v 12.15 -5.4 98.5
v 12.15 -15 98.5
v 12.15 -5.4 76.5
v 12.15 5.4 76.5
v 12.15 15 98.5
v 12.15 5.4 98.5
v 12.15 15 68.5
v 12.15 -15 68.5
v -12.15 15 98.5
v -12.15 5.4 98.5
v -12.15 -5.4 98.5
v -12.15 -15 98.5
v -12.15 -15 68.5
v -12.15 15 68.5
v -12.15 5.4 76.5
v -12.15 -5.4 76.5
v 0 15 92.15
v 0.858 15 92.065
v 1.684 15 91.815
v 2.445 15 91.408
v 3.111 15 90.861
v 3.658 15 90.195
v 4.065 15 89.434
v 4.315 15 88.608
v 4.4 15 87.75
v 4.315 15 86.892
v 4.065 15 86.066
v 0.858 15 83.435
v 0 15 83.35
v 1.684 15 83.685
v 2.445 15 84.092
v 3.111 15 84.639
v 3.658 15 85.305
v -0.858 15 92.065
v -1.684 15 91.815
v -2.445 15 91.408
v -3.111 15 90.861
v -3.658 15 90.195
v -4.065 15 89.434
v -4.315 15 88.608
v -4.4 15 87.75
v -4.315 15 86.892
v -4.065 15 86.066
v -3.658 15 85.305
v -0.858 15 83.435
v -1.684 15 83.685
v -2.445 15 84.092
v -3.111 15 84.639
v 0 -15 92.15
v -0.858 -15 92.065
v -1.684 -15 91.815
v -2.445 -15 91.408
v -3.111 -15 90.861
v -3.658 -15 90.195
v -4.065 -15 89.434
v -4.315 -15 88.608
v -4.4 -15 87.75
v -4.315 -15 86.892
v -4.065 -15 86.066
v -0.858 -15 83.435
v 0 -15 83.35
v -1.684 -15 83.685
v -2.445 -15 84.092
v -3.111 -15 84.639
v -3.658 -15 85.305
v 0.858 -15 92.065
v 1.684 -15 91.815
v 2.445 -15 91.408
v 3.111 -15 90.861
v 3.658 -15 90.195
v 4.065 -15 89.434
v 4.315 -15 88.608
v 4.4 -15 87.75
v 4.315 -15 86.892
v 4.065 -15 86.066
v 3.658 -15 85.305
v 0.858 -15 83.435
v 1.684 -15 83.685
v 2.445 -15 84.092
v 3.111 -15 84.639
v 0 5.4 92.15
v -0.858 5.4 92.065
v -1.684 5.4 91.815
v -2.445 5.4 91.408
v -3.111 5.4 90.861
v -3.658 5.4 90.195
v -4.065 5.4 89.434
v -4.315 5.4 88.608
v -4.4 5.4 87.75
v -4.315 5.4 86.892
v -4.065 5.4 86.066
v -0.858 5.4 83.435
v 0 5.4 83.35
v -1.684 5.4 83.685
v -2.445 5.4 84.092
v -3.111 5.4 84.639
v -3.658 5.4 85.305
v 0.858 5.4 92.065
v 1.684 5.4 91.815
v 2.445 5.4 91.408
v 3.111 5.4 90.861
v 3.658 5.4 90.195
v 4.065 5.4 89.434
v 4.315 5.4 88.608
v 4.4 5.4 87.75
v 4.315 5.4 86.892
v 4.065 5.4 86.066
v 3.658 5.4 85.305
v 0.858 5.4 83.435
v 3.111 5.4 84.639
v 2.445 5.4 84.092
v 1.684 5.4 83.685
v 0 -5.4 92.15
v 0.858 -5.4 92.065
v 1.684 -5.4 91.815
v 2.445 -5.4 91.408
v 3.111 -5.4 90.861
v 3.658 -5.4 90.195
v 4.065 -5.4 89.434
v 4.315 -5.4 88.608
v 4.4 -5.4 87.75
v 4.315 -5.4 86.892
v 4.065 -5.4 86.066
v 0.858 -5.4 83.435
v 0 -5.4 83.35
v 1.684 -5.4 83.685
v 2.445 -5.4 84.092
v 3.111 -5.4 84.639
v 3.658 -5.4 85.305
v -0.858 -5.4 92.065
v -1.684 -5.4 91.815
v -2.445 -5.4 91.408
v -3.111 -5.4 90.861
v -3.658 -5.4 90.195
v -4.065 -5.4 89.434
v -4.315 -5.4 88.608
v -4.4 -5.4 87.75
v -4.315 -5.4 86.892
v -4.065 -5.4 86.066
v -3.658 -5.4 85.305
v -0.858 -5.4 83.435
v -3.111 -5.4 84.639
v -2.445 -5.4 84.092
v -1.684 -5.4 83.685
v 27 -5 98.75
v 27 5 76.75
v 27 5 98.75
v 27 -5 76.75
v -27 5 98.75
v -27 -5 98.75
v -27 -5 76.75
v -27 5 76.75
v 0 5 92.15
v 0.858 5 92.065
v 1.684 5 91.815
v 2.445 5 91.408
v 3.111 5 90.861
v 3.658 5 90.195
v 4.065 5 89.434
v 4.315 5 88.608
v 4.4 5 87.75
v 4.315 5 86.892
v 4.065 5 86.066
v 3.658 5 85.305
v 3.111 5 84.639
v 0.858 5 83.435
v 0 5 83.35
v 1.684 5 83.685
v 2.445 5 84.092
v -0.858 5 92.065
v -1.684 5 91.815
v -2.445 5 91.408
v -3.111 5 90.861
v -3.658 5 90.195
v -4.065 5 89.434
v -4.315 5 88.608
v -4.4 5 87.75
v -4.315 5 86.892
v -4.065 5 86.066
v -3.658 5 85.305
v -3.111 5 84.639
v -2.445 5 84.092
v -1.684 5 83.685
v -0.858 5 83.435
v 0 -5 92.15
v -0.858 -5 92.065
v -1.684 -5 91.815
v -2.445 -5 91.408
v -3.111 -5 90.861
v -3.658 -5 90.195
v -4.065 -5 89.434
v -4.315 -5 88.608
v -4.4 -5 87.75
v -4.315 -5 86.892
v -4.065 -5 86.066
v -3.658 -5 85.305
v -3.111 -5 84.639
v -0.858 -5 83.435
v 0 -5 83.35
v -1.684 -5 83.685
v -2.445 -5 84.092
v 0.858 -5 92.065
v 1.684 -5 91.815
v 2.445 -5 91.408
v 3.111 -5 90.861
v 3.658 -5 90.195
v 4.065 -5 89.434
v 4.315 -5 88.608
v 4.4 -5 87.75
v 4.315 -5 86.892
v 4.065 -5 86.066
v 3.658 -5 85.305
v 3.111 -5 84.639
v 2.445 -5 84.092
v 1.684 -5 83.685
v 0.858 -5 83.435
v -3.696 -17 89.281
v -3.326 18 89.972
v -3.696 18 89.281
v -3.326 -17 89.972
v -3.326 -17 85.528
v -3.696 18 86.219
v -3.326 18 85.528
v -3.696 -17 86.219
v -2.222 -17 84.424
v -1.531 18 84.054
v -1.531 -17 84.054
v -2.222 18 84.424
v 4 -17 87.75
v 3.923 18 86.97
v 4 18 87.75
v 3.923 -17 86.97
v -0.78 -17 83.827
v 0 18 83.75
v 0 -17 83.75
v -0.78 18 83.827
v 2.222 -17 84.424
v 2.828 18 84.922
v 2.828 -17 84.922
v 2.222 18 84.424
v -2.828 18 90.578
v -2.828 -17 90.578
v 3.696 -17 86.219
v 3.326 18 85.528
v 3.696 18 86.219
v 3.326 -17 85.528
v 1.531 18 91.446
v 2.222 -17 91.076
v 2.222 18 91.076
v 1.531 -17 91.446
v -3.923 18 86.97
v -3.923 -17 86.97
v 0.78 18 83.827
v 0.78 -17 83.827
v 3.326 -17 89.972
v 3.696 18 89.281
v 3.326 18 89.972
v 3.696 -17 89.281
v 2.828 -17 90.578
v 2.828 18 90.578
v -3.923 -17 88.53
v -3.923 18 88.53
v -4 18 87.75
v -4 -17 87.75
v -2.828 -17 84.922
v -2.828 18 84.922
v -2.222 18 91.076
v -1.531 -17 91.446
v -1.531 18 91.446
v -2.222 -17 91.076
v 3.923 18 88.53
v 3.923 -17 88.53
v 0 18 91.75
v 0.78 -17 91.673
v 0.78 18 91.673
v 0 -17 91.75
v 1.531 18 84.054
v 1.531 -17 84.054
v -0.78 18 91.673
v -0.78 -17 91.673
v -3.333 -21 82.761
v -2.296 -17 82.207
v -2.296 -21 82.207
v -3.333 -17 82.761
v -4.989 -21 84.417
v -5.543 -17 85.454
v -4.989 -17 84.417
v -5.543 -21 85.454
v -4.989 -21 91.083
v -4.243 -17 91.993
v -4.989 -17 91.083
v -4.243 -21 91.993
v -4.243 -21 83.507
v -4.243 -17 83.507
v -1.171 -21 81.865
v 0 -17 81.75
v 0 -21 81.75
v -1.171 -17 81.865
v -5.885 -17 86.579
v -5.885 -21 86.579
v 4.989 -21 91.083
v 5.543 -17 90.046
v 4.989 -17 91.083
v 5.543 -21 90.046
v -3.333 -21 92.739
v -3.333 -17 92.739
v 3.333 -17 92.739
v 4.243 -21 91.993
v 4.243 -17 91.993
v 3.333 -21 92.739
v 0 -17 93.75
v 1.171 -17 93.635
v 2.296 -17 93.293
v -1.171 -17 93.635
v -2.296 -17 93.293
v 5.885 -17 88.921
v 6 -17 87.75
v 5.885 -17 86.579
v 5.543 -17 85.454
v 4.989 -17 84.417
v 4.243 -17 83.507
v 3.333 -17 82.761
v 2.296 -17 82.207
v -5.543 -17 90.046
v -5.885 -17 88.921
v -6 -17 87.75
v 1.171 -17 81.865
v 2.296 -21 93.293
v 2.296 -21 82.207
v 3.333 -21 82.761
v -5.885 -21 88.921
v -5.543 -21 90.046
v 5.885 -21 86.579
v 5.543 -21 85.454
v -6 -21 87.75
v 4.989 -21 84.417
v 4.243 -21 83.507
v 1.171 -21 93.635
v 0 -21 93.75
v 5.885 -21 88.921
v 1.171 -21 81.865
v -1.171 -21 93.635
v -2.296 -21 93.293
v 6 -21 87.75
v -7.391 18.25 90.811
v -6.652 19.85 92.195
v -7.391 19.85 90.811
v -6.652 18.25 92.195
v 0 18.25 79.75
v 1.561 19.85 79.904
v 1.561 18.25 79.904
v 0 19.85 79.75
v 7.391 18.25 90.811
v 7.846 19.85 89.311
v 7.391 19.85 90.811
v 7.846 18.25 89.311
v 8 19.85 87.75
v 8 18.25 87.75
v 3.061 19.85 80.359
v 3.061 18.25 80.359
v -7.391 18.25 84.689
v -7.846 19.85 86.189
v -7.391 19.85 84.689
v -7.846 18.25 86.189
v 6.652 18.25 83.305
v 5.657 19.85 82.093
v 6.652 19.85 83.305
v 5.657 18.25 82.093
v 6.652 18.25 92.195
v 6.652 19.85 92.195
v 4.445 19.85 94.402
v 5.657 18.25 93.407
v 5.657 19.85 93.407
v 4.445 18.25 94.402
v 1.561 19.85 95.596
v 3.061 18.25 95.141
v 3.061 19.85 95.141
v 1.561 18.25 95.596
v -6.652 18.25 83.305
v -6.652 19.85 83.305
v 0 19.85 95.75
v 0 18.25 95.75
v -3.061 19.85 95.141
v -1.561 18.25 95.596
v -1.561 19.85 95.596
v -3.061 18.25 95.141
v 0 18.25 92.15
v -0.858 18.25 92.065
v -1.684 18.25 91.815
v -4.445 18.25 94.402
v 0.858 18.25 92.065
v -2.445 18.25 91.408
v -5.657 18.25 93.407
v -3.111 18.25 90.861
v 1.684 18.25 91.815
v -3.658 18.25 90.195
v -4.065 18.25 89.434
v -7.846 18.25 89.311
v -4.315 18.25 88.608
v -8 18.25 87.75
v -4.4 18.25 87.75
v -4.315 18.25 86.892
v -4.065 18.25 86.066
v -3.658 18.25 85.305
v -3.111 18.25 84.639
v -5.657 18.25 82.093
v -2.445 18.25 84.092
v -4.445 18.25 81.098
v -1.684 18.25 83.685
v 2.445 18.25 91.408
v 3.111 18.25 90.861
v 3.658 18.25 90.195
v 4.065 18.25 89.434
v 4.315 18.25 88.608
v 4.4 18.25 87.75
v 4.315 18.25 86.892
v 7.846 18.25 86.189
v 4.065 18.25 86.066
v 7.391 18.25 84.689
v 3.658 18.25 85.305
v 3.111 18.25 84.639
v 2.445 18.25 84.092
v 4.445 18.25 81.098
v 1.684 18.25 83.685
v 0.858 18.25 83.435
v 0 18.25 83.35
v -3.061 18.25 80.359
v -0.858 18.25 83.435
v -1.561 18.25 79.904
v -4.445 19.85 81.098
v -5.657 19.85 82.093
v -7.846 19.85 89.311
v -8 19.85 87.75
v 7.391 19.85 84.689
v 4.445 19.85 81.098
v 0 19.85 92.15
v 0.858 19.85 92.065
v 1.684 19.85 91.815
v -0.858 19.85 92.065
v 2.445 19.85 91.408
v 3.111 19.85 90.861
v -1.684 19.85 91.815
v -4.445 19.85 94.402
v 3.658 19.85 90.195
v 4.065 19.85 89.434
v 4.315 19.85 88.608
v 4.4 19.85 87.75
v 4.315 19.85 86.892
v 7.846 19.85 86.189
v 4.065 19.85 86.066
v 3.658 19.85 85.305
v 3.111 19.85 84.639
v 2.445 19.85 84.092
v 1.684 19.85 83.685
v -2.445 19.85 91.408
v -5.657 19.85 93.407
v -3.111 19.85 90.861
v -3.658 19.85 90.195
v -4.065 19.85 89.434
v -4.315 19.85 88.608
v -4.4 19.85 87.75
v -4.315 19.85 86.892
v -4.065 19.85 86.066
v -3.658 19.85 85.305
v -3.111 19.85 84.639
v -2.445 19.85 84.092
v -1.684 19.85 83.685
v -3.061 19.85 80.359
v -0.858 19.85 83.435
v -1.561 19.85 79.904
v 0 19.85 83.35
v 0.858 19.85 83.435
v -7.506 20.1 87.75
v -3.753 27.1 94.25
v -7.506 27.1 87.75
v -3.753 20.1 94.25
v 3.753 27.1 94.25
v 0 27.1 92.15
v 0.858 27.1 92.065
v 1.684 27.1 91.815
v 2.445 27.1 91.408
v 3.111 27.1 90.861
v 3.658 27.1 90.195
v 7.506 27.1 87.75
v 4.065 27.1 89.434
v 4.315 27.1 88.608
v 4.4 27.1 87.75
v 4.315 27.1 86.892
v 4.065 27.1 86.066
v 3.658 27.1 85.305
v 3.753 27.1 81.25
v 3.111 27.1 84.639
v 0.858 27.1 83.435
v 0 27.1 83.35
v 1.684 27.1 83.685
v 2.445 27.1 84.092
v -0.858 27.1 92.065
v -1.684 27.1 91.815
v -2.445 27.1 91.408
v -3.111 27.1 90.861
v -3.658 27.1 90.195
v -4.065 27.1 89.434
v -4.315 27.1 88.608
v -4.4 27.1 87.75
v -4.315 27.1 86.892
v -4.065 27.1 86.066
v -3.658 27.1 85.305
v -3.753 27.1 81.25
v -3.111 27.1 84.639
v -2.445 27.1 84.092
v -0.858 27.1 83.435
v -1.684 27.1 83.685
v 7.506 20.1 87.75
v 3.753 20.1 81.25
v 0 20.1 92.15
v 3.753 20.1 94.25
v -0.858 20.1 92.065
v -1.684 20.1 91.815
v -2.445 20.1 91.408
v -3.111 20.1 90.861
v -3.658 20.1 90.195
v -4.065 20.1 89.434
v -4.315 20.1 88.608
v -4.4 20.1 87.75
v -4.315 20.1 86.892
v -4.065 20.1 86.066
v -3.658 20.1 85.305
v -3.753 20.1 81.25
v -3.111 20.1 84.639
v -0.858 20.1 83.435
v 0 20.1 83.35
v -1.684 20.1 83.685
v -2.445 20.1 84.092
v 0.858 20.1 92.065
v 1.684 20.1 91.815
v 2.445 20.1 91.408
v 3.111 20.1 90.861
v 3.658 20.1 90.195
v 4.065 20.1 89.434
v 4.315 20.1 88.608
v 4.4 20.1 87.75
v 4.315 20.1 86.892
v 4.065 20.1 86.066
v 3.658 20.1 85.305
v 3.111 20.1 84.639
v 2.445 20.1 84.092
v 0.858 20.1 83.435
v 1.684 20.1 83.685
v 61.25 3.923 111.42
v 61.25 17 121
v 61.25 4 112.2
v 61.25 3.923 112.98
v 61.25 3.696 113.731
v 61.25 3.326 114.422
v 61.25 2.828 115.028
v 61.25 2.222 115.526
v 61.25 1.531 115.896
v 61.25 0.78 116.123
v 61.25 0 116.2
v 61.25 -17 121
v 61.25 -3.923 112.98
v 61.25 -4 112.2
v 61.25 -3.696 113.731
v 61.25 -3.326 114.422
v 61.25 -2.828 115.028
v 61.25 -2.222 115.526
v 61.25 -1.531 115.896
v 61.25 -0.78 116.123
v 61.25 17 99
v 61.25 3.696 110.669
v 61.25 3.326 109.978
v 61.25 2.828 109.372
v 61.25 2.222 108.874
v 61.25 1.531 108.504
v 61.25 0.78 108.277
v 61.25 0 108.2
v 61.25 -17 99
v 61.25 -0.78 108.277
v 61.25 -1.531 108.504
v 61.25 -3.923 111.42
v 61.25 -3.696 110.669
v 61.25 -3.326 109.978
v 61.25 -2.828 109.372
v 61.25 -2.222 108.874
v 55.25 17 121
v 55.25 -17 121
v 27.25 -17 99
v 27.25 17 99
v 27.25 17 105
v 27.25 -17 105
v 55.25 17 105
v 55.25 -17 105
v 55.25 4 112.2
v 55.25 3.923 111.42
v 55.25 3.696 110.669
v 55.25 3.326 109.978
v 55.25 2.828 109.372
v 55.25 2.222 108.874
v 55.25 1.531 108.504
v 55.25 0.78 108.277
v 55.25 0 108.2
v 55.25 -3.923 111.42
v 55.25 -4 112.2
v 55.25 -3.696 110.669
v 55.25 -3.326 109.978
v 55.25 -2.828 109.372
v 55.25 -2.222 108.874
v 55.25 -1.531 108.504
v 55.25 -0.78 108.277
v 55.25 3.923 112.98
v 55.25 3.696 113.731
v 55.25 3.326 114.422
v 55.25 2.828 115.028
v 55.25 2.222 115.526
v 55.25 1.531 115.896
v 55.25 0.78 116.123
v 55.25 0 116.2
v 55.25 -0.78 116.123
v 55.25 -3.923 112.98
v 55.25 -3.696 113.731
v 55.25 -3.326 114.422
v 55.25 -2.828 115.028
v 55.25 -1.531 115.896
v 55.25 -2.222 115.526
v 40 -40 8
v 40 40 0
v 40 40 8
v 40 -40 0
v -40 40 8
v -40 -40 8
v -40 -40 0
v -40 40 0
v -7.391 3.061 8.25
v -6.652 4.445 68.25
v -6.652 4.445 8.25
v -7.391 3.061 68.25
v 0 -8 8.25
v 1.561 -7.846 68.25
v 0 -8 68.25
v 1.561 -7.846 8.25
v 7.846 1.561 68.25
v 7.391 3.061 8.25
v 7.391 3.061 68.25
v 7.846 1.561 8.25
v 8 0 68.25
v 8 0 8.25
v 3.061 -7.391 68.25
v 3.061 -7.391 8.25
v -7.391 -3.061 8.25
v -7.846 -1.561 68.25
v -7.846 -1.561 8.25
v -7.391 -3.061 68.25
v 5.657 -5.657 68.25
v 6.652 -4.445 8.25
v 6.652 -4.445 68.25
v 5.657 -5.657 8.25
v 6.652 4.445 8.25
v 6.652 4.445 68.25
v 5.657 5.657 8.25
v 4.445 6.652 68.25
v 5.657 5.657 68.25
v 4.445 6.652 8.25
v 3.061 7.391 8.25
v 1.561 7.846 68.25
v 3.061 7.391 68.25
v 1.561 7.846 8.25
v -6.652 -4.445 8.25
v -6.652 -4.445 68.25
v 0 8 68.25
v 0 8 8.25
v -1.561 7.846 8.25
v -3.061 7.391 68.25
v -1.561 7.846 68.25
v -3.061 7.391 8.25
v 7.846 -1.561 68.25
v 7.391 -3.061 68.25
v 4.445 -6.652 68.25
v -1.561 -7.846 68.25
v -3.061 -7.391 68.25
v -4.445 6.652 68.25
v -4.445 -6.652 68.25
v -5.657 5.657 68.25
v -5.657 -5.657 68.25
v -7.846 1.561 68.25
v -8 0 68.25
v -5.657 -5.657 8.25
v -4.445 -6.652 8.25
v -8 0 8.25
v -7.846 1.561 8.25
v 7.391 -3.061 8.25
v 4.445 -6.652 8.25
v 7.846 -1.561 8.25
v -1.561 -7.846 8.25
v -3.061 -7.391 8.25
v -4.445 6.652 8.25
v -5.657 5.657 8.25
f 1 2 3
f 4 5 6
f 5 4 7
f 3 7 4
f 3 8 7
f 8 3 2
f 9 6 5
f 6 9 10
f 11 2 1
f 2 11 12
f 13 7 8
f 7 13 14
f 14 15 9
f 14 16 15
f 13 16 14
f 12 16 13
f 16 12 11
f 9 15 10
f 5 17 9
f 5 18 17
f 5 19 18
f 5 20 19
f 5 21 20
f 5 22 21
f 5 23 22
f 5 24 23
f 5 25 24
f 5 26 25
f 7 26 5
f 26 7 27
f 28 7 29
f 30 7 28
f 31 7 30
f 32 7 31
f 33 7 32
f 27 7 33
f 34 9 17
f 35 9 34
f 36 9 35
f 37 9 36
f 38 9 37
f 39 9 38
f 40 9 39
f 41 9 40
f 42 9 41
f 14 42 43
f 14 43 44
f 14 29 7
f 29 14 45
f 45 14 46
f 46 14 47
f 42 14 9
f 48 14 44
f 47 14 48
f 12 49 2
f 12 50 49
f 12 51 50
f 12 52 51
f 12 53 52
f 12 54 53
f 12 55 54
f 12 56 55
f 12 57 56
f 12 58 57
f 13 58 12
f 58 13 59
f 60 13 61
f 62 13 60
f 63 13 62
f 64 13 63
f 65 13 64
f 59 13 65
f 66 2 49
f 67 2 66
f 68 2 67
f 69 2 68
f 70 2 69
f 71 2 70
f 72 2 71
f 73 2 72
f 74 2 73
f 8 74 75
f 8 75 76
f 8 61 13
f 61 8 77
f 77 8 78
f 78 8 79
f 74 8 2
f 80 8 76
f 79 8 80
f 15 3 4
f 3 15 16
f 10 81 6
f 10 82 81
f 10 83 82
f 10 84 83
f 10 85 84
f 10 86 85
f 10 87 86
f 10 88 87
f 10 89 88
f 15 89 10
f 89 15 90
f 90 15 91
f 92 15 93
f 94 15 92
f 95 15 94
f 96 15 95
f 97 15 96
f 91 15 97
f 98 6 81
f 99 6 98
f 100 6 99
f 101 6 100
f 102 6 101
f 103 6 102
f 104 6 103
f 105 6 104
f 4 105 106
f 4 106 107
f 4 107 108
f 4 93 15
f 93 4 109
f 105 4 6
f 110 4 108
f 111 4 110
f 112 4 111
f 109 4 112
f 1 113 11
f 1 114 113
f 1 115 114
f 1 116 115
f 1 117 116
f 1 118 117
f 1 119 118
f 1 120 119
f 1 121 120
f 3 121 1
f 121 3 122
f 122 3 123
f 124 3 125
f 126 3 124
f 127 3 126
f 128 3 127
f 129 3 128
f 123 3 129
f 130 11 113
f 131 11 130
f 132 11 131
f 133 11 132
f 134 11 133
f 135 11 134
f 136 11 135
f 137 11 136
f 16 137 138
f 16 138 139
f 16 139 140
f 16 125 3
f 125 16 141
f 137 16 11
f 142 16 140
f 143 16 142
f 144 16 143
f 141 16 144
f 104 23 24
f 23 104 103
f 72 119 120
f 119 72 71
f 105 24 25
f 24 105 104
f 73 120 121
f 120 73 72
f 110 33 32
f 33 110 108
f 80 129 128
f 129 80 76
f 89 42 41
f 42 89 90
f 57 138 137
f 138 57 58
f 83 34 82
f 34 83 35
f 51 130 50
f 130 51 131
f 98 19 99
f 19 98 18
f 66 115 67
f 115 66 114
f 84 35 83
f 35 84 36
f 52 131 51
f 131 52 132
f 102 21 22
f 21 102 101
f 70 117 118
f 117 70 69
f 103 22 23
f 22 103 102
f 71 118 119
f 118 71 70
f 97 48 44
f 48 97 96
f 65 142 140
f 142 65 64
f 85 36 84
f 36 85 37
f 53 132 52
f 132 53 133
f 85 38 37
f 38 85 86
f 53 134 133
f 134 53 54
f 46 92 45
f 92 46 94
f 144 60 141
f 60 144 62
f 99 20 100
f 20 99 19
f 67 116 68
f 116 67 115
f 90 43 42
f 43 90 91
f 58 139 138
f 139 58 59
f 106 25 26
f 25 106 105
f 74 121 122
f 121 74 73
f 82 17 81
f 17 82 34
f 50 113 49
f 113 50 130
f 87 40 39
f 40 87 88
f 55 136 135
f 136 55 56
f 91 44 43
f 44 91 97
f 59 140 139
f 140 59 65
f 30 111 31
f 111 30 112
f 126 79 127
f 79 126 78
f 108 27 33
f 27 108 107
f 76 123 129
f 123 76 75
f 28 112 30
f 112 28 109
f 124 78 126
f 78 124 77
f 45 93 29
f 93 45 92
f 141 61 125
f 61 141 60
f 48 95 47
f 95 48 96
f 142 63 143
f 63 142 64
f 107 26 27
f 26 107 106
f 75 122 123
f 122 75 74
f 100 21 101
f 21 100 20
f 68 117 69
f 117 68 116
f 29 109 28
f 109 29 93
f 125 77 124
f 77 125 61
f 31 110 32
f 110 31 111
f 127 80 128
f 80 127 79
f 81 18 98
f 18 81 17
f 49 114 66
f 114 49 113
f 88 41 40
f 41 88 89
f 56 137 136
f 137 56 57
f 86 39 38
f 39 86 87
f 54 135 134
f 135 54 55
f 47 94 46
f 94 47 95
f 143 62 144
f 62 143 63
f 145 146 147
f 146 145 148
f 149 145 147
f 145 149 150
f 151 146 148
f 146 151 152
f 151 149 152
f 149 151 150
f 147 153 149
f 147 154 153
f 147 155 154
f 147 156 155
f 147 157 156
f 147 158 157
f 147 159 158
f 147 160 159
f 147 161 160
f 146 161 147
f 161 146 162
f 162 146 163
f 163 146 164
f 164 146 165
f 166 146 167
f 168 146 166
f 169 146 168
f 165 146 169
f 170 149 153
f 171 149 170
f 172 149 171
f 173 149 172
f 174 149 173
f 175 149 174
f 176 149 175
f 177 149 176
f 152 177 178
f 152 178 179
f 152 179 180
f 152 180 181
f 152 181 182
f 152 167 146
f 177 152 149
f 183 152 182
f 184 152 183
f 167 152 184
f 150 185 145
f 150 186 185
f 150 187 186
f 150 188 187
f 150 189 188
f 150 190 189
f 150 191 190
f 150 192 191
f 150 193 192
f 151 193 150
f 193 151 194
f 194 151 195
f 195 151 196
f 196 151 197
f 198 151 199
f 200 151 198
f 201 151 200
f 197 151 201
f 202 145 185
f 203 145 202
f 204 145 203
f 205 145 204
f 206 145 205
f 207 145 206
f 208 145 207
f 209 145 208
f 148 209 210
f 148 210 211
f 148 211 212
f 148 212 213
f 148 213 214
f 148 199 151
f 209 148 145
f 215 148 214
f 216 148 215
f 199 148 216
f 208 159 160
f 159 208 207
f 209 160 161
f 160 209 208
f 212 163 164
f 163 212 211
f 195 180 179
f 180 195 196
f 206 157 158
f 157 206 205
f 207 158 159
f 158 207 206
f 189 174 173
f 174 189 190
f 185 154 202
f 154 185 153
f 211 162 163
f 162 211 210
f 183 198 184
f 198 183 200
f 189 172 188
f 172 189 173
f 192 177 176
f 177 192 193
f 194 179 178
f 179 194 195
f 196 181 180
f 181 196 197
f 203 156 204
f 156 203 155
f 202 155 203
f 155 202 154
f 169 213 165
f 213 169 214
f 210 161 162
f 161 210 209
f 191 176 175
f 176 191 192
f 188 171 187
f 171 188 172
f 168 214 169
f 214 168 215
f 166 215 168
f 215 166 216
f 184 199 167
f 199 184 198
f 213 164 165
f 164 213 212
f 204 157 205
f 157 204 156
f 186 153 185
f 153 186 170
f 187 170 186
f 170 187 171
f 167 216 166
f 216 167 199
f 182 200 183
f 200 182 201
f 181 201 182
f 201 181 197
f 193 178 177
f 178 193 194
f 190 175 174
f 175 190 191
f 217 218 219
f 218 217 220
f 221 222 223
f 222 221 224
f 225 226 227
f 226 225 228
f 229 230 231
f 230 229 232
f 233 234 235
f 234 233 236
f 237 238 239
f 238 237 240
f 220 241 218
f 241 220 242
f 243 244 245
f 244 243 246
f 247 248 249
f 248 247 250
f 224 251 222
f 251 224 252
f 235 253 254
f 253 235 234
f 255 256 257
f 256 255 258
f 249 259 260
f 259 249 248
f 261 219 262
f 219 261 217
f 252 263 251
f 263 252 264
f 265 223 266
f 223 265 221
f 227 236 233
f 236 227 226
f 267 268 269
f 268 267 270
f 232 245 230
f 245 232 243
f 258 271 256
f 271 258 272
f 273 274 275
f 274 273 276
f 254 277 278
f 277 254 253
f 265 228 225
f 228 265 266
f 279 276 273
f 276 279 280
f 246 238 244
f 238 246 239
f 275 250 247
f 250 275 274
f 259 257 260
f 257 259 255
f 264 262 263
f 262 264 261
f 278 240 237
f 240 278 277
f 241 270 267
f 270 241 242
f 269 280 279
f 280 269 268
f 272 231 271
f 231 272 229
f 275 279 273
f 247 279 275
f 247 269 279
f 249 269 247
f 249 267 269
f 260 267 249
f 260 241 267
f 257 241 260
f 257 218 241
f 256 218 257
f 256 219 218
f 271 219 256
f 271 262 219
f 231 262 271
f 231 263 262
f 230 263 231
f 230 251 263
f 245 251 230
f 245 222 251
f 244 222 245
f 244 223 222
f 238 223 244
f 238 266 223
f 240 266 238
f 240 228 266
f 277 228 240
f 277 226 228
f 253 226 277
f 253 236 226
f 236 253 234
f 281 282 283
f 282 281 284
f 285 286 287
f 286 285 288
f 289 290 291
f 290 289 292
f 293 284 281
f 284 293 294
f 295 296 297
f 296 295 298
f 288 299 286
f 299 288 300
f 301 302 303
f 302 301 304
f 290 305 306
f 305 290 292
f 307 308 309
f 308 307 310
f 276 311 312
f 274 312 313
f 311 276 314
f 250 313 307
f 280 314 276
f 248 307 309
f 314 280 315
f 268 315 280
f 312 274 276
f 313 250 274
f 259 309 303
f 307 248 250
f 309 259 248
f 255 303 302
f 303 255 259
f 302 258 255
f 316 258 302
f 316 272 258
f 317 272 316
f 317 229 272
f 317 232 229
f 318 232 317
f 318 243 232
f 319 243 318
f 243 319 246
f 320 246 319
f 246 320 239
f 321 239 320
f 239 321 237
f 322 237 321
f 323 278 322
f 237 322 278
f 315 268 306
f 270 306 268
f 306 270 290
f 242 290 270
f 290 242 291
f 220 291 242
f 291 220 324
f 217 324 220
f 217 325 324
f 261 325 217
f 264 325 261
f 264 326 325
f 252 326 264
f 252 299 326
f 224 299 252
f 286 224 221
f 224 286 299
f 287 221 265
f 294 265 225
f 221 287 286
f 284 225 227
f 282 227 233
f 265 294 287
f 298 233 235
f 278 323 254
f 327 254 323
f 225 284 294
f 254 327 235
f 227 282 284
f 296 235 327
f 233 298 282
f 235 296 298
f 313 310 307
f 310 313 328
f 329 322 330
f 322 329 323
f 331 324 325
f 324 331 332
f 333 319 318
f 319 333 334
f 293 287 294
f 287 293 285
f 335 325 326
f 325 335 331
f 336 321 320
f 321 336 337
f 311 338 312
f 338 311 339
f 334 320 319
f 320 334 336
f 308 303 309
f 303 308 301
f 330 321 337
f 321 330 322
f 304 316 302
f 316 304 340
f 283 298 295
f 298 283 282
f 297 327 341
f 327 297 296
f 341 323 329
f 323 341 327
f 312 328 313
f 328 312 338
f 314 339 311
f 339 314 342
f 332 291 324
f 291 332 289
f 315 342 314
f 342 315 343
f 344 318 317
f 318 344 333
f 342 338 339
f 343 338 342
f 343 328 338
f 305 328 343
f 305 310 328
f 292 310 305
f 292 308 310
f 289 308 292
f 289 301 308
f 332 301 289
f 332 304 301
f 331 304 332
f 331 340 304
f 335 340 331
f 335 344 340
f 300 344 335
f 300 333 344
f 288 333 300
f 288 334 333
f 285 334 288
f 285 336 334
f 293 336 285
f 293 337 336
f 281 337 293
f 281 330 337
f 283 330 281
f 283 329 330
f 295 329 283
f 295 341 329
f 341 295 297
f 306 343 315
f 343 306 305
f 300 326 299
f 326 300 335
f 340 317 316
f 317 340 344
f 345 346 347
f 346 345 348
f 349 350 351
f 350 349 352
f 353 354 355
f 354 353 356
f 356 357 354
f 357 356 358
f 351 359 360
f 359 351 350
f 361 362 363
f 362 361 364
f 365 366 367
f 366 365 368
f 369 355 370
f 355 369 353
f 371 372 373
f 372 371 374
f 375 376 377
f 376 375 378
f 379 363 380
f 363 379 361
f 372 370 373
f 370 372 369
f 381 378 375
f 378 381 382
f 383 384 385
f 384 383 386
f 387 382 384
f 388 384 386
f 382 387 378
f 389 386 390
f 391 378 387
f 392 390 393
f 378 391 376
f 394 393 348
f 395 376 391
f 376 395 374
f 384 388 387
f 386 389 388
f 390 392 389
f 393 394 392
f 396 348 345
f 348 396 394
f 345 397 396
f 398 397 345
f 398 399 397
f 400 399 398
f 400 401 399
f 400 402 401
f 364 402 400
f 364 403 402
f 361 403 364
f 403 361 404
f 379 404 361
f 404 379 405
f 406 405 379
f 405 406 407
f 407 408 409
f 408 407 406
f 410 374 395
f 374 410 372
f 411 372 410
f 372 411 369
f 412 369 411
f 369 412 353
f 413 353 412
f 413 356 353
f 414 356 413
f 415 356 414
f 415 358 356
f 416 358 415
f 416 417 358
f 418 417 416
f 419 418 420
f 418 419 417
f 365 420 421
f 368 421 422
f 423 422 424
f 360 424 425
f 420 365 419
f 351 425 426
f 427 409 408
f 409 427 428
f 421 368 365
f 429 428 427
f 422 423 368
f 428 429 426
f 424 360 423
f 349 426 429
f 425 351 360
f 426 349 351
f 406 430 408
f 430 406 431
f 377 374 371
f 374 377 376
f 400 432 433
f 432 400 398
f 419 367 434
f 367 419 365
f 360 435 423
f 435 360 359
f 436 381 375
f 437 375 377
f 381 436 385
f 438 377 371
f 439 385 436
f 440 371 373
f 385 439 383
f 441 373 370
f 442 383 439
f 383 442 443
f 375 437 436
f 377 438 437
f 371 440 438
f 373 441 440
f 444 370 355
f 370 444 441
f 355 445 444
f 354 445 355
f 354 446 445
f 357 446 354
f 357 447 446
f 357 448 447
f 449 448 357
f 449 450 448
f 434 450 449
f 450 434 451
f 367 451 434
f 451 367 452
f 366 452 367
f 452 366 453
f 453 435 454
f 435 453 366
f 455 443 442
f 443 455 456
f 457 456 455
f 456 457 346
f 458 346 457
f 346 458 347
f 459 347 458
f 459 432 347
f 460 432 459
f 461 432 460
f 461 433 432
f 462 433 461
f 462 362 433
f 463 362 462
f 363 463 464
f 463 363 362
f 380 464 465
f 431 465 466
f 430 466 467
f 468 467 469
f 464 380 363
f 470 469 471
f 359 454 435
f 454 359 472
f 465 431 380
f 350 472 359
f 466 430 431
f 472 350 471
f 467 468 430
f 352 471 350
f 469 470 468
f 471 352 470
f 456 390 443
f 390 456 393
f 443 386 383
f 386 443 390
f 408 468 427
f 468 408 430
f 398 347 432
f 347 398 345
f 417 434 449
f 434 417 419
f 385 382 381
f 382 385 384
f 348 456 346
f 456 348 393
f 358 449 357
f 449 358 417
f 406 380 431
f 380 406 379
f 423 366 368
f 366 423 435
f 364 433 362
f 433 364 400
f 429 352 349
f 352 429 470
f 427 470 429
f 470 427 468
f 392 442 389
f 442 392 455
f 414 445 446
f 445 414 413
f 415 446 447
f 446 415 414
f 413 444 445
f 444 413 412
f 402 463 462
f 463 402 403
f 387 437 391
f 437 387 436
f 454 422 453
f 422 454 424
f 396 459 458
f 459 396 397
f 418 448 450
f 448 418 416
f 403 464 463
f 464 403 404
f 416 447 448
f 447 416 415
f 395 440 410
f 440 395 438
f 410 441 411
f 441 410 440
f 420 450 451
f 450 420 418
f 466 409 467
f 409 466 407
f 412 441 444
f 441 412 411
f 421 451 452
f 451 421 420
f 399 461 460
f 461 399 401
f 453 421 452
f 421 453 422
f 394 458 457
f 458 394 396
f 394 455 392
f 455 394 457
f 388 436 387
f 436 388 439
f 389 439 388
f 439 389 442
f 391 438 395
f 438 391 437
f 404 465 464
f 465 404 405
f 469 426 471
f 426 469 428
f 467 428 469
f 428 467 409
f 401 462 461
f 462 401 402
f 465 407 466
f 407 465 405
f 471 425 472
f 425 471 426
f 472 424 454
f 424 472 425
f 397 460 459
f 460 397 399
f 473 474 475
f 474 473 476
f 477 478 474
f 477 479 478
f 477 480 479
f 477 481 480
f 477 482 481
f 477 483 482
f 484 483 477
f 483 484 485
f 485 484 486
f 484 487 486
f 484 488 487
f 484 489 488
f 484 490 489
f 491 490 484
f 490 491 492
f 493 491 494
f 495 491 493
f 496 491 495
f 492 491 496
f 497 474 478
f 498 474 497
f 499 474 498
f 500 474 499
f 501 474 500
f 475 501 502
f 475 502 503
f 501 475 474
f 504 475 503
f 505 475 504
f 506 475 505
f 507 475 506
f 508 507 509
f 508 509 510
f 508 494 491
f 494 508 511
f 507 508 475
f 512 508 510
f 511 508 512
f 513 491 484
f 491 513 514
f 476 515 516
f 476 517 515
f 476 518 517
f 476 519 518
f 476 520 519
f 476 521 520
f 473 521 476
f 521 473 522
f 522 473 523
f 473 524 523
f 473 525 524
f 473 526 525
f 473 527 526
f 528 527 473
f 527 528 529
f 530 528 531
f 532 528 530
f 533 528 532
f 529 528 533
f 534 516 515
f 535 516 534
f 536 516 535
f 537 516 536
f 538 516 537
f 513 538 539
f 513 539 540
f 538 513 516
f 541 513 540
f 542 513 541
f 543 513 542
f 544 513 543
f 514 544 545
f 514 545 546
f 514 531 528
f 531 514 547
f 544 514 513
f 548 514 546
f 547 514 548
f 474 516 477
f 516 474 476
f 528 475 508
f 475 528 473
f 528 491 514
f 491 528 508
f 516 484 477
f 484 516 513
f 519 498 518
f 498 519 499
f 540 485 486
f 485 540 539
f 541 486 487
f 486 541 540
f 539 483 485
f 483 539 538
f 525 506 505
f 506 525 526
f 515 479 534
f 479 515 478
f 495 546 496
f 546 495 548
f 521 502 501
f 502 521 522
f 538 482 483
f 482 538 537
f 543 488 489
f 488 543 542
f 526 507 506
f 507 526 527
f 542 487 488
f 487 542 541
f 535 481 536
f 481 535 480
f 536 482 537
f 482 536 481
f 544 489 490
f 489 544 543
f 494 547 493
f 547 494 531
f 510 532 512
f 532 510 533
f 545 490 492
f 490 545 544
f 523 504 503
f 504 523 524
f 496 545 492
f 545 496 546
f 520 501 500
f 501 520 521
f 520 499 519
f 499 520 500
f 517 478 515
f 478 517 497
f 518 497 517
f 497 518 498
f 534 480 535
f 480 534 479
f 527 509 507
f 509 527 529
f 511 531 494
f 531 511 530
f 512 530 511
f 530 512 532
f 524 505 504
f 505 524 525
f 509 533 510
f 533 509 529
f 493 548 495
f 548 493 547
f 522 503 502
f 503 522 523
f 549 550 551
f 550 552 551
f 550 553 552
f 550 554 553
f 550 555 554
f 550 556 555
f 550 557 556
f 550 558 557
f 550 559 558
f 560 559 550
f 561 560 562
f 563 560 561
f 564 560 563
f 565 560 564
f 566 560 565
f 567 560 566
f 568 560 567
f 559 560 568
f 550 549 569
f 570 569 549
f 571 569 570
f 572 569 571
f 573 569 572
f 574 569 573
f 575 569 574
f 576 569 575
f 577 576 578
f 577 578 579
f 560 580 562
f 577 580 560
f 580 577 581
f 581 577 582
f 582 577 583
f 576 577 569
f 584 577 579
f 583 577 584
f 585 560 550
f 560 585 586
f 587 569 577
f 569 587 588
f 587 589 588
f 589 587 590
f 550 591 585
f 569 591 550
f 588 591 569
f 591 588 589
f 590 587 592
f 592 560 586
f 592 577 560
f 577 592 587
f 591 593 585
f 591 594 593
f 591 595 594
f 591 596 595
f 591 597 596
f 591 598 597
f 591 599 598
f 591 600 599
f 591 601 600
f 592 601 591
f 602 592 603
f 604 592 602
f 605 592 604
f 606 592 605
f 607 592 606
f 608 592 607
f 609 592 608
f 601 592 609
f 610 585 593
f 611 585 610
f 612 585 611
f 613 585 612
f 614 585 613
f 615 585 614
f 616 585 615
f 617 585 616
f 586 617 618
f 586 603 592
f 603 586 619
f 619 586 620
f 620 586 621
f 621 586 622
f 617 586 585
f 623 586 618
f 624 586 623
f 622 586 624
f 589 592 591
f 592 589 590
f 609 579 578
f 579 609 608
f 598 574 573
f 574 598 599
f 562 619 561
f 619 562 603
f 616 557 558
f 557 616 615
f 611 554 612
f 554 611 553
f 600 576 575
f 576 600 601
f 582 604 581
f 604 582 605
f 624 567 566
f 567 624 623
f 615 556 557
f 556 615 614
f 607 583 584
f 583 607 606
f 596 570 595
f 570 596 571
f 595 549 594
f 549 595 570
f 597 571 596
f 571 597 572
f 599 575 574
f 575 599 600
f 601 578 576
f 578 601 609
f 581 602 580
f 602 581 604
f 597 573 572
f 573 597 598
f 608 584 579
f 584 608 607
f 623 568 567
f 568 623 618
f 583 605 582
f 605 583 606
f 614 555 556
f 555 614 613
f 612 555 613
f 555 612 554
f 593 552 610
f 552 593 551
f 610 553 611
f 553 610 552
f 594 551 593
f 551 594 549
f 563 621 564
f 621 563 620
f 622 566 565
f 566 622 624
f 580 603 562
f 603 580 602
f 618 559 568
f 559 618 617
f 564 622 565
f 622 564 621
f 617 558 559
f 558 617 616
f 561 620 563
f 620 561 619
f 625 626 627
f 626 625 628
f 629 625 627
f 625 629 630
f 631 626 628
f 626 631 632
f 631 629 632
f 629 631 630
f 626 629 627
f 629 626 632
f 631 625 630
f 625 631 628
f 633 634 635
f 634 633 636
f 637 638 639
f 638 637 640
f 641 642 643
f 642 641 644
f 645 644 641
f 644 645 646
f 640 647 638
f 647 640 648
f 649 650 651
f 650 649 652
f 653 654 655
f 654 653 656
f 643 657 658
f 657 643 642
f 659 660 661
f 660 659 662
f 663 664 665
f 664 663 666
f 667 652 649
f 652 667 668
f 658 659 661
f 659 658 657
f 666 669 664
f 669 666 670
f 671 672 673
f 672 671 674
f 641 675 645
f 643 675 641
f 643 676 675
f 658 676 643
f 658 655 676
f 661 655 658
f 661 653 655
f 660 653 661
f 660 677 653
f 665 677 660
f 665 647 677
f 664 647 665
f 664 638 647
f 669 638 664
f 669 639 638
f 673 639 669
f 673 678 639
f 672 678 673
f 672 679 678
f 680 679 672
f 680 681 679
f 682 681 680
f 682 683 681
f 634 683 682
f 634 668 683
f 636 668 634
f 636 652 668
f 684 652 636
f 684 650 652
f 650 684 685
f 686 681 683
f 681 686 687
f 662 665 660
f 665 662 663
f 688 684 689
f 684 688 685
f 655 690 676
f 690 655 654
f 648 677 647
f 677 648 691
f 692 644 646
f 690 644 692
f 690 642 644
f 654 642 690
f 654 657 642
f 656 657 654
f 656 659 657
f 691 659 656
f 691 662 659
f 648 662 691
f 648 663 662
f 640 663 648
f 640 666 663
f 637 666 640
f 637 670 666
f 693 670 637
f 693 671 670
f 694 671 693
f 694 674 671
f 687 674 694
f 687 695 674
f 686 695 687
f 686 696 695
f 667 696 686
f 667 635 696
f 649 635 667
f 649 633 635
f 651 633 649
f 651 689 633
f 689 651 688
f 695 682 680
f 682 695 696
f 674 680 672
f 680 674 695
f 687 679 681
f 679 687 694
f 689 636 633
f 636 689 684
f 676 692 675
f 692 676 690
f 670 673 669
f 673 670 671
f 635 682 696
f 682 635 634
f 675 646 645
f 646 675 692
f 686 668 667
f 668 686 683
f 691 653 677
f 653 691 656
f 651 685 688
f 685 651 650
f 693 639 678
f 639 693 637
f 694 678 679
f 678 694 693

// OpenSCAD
$fn = 32;

// ------------------------------------------------------------------------
// Lamp arm: column d16 x 60 mm, arm 54 mm
// Every part is its own module, assembly() places every instance.
// ------------------------------------------------------------------------

// --- part 1 ---
module lamp_base() {
  difference() {
    translate([-40, -40, 0]) cube([80, 80, 8]);
  }
}

// --- part 2 ---
module lamp_column() {
  cylinder(h = 60, d = 16);
}

// --- part 3 ---
module head_fork() {
  difference() {
    translate([-12.15, -15, 0]) cube([24.3, 30, 30]);
    translate([-13.15, -5.4, 8]) cube([26.3, 10.8, 23]);
    translate([0, 0, 19.25]) rotate([90, 0, 0]) cylinder(h = 32, d = 8.8, center = true);
  }
}

// --- part 4 ---
module lamp_arm() {
  difference() {
    translate([-27, -5, 0]) cube([54, 10, 22]);
    translate([0, 0, 11]) rotate([90, 0, 0]) cylinder(h = 12, d = 8.8, center = true);
  }
}

// --- part 5 ---
module arm_pin() {
  rotate([0, 90, 0]) cylinder(h = 36, d = 8, center = true);
  translate([-21, 0, 0]) rotate([0, 90, 0]) cylinder(h = 4, d = 12);
}

// --- part 6 ---
module arm_washer() {
  difference() {
      translate([0, 0, 0]) cylinder(h = 1.6, d = 16);
      translate([0, 0, -1]) cylinder(h = 3.6, d = 8.8);
    }
}

// --- part 7 ---
module arm_nut() {
  difference() {
    linear_extrude(height = 7) polygon(points = [[7.506, 0], [3.753, 6.5], [-3.753, 6.5], [-7.506, 0], [-3.753, -6.5], [3.753, -6.5]]);
    translate([0, 0, -1]) cylinder(h = 9, d = 8.8);
  }
}

// --- part 8 ---
module shade_bracket() {
  difference() {
    translate([-17, -17, 0]) cube([34, 34, 22]);
    translate([-18, -18, 6]) cube([29, 36, 17]);
    translate([14, 0, 13.2]) rotate([0, 90, 0]) cylinder(h = 8, d = 8, center = true);
  }
}

// --- assembly ---
module assembly() {
  color([0.80, 0.24, 0.20]) translate([0, 0, 0]) rotate([0, 0, 0]) lamp_base();
  color([0.20, 0.45, 0.75]) translate([0, 0, 8.25]) rotate([0, 0, 0]) lamp_column();
  color([0.25, 0.62, 0.32]) translate([0, 0, 68.5]) rotate([0, 0, 0]) head_fork();
  color([0.92, 0.70, 0.18]) translate([0, 0, 76.75]) rotate([0, 0, 0]) lamp_arm();
  color([0.58, 0.35, 0.70]) translate([0, 0, 87.75]) rotate([0, 0, 90]) arm_pin();
  color([0.16, 0.66, 0.66]) translate([0, 19.85, 87.75]) rotate([90, 0, 0]) arm_washer();
  color([0.85, 0.48, 0.18]) translate([0, 27.1, 87.75]) rotate([90, 0, 0]) arm_nut();
  color([0.55, 0.60, 0.65]) translate([44.25, 0, 99]) rotate([0, 0, 0]) shade_bracket();
}

assembly();
